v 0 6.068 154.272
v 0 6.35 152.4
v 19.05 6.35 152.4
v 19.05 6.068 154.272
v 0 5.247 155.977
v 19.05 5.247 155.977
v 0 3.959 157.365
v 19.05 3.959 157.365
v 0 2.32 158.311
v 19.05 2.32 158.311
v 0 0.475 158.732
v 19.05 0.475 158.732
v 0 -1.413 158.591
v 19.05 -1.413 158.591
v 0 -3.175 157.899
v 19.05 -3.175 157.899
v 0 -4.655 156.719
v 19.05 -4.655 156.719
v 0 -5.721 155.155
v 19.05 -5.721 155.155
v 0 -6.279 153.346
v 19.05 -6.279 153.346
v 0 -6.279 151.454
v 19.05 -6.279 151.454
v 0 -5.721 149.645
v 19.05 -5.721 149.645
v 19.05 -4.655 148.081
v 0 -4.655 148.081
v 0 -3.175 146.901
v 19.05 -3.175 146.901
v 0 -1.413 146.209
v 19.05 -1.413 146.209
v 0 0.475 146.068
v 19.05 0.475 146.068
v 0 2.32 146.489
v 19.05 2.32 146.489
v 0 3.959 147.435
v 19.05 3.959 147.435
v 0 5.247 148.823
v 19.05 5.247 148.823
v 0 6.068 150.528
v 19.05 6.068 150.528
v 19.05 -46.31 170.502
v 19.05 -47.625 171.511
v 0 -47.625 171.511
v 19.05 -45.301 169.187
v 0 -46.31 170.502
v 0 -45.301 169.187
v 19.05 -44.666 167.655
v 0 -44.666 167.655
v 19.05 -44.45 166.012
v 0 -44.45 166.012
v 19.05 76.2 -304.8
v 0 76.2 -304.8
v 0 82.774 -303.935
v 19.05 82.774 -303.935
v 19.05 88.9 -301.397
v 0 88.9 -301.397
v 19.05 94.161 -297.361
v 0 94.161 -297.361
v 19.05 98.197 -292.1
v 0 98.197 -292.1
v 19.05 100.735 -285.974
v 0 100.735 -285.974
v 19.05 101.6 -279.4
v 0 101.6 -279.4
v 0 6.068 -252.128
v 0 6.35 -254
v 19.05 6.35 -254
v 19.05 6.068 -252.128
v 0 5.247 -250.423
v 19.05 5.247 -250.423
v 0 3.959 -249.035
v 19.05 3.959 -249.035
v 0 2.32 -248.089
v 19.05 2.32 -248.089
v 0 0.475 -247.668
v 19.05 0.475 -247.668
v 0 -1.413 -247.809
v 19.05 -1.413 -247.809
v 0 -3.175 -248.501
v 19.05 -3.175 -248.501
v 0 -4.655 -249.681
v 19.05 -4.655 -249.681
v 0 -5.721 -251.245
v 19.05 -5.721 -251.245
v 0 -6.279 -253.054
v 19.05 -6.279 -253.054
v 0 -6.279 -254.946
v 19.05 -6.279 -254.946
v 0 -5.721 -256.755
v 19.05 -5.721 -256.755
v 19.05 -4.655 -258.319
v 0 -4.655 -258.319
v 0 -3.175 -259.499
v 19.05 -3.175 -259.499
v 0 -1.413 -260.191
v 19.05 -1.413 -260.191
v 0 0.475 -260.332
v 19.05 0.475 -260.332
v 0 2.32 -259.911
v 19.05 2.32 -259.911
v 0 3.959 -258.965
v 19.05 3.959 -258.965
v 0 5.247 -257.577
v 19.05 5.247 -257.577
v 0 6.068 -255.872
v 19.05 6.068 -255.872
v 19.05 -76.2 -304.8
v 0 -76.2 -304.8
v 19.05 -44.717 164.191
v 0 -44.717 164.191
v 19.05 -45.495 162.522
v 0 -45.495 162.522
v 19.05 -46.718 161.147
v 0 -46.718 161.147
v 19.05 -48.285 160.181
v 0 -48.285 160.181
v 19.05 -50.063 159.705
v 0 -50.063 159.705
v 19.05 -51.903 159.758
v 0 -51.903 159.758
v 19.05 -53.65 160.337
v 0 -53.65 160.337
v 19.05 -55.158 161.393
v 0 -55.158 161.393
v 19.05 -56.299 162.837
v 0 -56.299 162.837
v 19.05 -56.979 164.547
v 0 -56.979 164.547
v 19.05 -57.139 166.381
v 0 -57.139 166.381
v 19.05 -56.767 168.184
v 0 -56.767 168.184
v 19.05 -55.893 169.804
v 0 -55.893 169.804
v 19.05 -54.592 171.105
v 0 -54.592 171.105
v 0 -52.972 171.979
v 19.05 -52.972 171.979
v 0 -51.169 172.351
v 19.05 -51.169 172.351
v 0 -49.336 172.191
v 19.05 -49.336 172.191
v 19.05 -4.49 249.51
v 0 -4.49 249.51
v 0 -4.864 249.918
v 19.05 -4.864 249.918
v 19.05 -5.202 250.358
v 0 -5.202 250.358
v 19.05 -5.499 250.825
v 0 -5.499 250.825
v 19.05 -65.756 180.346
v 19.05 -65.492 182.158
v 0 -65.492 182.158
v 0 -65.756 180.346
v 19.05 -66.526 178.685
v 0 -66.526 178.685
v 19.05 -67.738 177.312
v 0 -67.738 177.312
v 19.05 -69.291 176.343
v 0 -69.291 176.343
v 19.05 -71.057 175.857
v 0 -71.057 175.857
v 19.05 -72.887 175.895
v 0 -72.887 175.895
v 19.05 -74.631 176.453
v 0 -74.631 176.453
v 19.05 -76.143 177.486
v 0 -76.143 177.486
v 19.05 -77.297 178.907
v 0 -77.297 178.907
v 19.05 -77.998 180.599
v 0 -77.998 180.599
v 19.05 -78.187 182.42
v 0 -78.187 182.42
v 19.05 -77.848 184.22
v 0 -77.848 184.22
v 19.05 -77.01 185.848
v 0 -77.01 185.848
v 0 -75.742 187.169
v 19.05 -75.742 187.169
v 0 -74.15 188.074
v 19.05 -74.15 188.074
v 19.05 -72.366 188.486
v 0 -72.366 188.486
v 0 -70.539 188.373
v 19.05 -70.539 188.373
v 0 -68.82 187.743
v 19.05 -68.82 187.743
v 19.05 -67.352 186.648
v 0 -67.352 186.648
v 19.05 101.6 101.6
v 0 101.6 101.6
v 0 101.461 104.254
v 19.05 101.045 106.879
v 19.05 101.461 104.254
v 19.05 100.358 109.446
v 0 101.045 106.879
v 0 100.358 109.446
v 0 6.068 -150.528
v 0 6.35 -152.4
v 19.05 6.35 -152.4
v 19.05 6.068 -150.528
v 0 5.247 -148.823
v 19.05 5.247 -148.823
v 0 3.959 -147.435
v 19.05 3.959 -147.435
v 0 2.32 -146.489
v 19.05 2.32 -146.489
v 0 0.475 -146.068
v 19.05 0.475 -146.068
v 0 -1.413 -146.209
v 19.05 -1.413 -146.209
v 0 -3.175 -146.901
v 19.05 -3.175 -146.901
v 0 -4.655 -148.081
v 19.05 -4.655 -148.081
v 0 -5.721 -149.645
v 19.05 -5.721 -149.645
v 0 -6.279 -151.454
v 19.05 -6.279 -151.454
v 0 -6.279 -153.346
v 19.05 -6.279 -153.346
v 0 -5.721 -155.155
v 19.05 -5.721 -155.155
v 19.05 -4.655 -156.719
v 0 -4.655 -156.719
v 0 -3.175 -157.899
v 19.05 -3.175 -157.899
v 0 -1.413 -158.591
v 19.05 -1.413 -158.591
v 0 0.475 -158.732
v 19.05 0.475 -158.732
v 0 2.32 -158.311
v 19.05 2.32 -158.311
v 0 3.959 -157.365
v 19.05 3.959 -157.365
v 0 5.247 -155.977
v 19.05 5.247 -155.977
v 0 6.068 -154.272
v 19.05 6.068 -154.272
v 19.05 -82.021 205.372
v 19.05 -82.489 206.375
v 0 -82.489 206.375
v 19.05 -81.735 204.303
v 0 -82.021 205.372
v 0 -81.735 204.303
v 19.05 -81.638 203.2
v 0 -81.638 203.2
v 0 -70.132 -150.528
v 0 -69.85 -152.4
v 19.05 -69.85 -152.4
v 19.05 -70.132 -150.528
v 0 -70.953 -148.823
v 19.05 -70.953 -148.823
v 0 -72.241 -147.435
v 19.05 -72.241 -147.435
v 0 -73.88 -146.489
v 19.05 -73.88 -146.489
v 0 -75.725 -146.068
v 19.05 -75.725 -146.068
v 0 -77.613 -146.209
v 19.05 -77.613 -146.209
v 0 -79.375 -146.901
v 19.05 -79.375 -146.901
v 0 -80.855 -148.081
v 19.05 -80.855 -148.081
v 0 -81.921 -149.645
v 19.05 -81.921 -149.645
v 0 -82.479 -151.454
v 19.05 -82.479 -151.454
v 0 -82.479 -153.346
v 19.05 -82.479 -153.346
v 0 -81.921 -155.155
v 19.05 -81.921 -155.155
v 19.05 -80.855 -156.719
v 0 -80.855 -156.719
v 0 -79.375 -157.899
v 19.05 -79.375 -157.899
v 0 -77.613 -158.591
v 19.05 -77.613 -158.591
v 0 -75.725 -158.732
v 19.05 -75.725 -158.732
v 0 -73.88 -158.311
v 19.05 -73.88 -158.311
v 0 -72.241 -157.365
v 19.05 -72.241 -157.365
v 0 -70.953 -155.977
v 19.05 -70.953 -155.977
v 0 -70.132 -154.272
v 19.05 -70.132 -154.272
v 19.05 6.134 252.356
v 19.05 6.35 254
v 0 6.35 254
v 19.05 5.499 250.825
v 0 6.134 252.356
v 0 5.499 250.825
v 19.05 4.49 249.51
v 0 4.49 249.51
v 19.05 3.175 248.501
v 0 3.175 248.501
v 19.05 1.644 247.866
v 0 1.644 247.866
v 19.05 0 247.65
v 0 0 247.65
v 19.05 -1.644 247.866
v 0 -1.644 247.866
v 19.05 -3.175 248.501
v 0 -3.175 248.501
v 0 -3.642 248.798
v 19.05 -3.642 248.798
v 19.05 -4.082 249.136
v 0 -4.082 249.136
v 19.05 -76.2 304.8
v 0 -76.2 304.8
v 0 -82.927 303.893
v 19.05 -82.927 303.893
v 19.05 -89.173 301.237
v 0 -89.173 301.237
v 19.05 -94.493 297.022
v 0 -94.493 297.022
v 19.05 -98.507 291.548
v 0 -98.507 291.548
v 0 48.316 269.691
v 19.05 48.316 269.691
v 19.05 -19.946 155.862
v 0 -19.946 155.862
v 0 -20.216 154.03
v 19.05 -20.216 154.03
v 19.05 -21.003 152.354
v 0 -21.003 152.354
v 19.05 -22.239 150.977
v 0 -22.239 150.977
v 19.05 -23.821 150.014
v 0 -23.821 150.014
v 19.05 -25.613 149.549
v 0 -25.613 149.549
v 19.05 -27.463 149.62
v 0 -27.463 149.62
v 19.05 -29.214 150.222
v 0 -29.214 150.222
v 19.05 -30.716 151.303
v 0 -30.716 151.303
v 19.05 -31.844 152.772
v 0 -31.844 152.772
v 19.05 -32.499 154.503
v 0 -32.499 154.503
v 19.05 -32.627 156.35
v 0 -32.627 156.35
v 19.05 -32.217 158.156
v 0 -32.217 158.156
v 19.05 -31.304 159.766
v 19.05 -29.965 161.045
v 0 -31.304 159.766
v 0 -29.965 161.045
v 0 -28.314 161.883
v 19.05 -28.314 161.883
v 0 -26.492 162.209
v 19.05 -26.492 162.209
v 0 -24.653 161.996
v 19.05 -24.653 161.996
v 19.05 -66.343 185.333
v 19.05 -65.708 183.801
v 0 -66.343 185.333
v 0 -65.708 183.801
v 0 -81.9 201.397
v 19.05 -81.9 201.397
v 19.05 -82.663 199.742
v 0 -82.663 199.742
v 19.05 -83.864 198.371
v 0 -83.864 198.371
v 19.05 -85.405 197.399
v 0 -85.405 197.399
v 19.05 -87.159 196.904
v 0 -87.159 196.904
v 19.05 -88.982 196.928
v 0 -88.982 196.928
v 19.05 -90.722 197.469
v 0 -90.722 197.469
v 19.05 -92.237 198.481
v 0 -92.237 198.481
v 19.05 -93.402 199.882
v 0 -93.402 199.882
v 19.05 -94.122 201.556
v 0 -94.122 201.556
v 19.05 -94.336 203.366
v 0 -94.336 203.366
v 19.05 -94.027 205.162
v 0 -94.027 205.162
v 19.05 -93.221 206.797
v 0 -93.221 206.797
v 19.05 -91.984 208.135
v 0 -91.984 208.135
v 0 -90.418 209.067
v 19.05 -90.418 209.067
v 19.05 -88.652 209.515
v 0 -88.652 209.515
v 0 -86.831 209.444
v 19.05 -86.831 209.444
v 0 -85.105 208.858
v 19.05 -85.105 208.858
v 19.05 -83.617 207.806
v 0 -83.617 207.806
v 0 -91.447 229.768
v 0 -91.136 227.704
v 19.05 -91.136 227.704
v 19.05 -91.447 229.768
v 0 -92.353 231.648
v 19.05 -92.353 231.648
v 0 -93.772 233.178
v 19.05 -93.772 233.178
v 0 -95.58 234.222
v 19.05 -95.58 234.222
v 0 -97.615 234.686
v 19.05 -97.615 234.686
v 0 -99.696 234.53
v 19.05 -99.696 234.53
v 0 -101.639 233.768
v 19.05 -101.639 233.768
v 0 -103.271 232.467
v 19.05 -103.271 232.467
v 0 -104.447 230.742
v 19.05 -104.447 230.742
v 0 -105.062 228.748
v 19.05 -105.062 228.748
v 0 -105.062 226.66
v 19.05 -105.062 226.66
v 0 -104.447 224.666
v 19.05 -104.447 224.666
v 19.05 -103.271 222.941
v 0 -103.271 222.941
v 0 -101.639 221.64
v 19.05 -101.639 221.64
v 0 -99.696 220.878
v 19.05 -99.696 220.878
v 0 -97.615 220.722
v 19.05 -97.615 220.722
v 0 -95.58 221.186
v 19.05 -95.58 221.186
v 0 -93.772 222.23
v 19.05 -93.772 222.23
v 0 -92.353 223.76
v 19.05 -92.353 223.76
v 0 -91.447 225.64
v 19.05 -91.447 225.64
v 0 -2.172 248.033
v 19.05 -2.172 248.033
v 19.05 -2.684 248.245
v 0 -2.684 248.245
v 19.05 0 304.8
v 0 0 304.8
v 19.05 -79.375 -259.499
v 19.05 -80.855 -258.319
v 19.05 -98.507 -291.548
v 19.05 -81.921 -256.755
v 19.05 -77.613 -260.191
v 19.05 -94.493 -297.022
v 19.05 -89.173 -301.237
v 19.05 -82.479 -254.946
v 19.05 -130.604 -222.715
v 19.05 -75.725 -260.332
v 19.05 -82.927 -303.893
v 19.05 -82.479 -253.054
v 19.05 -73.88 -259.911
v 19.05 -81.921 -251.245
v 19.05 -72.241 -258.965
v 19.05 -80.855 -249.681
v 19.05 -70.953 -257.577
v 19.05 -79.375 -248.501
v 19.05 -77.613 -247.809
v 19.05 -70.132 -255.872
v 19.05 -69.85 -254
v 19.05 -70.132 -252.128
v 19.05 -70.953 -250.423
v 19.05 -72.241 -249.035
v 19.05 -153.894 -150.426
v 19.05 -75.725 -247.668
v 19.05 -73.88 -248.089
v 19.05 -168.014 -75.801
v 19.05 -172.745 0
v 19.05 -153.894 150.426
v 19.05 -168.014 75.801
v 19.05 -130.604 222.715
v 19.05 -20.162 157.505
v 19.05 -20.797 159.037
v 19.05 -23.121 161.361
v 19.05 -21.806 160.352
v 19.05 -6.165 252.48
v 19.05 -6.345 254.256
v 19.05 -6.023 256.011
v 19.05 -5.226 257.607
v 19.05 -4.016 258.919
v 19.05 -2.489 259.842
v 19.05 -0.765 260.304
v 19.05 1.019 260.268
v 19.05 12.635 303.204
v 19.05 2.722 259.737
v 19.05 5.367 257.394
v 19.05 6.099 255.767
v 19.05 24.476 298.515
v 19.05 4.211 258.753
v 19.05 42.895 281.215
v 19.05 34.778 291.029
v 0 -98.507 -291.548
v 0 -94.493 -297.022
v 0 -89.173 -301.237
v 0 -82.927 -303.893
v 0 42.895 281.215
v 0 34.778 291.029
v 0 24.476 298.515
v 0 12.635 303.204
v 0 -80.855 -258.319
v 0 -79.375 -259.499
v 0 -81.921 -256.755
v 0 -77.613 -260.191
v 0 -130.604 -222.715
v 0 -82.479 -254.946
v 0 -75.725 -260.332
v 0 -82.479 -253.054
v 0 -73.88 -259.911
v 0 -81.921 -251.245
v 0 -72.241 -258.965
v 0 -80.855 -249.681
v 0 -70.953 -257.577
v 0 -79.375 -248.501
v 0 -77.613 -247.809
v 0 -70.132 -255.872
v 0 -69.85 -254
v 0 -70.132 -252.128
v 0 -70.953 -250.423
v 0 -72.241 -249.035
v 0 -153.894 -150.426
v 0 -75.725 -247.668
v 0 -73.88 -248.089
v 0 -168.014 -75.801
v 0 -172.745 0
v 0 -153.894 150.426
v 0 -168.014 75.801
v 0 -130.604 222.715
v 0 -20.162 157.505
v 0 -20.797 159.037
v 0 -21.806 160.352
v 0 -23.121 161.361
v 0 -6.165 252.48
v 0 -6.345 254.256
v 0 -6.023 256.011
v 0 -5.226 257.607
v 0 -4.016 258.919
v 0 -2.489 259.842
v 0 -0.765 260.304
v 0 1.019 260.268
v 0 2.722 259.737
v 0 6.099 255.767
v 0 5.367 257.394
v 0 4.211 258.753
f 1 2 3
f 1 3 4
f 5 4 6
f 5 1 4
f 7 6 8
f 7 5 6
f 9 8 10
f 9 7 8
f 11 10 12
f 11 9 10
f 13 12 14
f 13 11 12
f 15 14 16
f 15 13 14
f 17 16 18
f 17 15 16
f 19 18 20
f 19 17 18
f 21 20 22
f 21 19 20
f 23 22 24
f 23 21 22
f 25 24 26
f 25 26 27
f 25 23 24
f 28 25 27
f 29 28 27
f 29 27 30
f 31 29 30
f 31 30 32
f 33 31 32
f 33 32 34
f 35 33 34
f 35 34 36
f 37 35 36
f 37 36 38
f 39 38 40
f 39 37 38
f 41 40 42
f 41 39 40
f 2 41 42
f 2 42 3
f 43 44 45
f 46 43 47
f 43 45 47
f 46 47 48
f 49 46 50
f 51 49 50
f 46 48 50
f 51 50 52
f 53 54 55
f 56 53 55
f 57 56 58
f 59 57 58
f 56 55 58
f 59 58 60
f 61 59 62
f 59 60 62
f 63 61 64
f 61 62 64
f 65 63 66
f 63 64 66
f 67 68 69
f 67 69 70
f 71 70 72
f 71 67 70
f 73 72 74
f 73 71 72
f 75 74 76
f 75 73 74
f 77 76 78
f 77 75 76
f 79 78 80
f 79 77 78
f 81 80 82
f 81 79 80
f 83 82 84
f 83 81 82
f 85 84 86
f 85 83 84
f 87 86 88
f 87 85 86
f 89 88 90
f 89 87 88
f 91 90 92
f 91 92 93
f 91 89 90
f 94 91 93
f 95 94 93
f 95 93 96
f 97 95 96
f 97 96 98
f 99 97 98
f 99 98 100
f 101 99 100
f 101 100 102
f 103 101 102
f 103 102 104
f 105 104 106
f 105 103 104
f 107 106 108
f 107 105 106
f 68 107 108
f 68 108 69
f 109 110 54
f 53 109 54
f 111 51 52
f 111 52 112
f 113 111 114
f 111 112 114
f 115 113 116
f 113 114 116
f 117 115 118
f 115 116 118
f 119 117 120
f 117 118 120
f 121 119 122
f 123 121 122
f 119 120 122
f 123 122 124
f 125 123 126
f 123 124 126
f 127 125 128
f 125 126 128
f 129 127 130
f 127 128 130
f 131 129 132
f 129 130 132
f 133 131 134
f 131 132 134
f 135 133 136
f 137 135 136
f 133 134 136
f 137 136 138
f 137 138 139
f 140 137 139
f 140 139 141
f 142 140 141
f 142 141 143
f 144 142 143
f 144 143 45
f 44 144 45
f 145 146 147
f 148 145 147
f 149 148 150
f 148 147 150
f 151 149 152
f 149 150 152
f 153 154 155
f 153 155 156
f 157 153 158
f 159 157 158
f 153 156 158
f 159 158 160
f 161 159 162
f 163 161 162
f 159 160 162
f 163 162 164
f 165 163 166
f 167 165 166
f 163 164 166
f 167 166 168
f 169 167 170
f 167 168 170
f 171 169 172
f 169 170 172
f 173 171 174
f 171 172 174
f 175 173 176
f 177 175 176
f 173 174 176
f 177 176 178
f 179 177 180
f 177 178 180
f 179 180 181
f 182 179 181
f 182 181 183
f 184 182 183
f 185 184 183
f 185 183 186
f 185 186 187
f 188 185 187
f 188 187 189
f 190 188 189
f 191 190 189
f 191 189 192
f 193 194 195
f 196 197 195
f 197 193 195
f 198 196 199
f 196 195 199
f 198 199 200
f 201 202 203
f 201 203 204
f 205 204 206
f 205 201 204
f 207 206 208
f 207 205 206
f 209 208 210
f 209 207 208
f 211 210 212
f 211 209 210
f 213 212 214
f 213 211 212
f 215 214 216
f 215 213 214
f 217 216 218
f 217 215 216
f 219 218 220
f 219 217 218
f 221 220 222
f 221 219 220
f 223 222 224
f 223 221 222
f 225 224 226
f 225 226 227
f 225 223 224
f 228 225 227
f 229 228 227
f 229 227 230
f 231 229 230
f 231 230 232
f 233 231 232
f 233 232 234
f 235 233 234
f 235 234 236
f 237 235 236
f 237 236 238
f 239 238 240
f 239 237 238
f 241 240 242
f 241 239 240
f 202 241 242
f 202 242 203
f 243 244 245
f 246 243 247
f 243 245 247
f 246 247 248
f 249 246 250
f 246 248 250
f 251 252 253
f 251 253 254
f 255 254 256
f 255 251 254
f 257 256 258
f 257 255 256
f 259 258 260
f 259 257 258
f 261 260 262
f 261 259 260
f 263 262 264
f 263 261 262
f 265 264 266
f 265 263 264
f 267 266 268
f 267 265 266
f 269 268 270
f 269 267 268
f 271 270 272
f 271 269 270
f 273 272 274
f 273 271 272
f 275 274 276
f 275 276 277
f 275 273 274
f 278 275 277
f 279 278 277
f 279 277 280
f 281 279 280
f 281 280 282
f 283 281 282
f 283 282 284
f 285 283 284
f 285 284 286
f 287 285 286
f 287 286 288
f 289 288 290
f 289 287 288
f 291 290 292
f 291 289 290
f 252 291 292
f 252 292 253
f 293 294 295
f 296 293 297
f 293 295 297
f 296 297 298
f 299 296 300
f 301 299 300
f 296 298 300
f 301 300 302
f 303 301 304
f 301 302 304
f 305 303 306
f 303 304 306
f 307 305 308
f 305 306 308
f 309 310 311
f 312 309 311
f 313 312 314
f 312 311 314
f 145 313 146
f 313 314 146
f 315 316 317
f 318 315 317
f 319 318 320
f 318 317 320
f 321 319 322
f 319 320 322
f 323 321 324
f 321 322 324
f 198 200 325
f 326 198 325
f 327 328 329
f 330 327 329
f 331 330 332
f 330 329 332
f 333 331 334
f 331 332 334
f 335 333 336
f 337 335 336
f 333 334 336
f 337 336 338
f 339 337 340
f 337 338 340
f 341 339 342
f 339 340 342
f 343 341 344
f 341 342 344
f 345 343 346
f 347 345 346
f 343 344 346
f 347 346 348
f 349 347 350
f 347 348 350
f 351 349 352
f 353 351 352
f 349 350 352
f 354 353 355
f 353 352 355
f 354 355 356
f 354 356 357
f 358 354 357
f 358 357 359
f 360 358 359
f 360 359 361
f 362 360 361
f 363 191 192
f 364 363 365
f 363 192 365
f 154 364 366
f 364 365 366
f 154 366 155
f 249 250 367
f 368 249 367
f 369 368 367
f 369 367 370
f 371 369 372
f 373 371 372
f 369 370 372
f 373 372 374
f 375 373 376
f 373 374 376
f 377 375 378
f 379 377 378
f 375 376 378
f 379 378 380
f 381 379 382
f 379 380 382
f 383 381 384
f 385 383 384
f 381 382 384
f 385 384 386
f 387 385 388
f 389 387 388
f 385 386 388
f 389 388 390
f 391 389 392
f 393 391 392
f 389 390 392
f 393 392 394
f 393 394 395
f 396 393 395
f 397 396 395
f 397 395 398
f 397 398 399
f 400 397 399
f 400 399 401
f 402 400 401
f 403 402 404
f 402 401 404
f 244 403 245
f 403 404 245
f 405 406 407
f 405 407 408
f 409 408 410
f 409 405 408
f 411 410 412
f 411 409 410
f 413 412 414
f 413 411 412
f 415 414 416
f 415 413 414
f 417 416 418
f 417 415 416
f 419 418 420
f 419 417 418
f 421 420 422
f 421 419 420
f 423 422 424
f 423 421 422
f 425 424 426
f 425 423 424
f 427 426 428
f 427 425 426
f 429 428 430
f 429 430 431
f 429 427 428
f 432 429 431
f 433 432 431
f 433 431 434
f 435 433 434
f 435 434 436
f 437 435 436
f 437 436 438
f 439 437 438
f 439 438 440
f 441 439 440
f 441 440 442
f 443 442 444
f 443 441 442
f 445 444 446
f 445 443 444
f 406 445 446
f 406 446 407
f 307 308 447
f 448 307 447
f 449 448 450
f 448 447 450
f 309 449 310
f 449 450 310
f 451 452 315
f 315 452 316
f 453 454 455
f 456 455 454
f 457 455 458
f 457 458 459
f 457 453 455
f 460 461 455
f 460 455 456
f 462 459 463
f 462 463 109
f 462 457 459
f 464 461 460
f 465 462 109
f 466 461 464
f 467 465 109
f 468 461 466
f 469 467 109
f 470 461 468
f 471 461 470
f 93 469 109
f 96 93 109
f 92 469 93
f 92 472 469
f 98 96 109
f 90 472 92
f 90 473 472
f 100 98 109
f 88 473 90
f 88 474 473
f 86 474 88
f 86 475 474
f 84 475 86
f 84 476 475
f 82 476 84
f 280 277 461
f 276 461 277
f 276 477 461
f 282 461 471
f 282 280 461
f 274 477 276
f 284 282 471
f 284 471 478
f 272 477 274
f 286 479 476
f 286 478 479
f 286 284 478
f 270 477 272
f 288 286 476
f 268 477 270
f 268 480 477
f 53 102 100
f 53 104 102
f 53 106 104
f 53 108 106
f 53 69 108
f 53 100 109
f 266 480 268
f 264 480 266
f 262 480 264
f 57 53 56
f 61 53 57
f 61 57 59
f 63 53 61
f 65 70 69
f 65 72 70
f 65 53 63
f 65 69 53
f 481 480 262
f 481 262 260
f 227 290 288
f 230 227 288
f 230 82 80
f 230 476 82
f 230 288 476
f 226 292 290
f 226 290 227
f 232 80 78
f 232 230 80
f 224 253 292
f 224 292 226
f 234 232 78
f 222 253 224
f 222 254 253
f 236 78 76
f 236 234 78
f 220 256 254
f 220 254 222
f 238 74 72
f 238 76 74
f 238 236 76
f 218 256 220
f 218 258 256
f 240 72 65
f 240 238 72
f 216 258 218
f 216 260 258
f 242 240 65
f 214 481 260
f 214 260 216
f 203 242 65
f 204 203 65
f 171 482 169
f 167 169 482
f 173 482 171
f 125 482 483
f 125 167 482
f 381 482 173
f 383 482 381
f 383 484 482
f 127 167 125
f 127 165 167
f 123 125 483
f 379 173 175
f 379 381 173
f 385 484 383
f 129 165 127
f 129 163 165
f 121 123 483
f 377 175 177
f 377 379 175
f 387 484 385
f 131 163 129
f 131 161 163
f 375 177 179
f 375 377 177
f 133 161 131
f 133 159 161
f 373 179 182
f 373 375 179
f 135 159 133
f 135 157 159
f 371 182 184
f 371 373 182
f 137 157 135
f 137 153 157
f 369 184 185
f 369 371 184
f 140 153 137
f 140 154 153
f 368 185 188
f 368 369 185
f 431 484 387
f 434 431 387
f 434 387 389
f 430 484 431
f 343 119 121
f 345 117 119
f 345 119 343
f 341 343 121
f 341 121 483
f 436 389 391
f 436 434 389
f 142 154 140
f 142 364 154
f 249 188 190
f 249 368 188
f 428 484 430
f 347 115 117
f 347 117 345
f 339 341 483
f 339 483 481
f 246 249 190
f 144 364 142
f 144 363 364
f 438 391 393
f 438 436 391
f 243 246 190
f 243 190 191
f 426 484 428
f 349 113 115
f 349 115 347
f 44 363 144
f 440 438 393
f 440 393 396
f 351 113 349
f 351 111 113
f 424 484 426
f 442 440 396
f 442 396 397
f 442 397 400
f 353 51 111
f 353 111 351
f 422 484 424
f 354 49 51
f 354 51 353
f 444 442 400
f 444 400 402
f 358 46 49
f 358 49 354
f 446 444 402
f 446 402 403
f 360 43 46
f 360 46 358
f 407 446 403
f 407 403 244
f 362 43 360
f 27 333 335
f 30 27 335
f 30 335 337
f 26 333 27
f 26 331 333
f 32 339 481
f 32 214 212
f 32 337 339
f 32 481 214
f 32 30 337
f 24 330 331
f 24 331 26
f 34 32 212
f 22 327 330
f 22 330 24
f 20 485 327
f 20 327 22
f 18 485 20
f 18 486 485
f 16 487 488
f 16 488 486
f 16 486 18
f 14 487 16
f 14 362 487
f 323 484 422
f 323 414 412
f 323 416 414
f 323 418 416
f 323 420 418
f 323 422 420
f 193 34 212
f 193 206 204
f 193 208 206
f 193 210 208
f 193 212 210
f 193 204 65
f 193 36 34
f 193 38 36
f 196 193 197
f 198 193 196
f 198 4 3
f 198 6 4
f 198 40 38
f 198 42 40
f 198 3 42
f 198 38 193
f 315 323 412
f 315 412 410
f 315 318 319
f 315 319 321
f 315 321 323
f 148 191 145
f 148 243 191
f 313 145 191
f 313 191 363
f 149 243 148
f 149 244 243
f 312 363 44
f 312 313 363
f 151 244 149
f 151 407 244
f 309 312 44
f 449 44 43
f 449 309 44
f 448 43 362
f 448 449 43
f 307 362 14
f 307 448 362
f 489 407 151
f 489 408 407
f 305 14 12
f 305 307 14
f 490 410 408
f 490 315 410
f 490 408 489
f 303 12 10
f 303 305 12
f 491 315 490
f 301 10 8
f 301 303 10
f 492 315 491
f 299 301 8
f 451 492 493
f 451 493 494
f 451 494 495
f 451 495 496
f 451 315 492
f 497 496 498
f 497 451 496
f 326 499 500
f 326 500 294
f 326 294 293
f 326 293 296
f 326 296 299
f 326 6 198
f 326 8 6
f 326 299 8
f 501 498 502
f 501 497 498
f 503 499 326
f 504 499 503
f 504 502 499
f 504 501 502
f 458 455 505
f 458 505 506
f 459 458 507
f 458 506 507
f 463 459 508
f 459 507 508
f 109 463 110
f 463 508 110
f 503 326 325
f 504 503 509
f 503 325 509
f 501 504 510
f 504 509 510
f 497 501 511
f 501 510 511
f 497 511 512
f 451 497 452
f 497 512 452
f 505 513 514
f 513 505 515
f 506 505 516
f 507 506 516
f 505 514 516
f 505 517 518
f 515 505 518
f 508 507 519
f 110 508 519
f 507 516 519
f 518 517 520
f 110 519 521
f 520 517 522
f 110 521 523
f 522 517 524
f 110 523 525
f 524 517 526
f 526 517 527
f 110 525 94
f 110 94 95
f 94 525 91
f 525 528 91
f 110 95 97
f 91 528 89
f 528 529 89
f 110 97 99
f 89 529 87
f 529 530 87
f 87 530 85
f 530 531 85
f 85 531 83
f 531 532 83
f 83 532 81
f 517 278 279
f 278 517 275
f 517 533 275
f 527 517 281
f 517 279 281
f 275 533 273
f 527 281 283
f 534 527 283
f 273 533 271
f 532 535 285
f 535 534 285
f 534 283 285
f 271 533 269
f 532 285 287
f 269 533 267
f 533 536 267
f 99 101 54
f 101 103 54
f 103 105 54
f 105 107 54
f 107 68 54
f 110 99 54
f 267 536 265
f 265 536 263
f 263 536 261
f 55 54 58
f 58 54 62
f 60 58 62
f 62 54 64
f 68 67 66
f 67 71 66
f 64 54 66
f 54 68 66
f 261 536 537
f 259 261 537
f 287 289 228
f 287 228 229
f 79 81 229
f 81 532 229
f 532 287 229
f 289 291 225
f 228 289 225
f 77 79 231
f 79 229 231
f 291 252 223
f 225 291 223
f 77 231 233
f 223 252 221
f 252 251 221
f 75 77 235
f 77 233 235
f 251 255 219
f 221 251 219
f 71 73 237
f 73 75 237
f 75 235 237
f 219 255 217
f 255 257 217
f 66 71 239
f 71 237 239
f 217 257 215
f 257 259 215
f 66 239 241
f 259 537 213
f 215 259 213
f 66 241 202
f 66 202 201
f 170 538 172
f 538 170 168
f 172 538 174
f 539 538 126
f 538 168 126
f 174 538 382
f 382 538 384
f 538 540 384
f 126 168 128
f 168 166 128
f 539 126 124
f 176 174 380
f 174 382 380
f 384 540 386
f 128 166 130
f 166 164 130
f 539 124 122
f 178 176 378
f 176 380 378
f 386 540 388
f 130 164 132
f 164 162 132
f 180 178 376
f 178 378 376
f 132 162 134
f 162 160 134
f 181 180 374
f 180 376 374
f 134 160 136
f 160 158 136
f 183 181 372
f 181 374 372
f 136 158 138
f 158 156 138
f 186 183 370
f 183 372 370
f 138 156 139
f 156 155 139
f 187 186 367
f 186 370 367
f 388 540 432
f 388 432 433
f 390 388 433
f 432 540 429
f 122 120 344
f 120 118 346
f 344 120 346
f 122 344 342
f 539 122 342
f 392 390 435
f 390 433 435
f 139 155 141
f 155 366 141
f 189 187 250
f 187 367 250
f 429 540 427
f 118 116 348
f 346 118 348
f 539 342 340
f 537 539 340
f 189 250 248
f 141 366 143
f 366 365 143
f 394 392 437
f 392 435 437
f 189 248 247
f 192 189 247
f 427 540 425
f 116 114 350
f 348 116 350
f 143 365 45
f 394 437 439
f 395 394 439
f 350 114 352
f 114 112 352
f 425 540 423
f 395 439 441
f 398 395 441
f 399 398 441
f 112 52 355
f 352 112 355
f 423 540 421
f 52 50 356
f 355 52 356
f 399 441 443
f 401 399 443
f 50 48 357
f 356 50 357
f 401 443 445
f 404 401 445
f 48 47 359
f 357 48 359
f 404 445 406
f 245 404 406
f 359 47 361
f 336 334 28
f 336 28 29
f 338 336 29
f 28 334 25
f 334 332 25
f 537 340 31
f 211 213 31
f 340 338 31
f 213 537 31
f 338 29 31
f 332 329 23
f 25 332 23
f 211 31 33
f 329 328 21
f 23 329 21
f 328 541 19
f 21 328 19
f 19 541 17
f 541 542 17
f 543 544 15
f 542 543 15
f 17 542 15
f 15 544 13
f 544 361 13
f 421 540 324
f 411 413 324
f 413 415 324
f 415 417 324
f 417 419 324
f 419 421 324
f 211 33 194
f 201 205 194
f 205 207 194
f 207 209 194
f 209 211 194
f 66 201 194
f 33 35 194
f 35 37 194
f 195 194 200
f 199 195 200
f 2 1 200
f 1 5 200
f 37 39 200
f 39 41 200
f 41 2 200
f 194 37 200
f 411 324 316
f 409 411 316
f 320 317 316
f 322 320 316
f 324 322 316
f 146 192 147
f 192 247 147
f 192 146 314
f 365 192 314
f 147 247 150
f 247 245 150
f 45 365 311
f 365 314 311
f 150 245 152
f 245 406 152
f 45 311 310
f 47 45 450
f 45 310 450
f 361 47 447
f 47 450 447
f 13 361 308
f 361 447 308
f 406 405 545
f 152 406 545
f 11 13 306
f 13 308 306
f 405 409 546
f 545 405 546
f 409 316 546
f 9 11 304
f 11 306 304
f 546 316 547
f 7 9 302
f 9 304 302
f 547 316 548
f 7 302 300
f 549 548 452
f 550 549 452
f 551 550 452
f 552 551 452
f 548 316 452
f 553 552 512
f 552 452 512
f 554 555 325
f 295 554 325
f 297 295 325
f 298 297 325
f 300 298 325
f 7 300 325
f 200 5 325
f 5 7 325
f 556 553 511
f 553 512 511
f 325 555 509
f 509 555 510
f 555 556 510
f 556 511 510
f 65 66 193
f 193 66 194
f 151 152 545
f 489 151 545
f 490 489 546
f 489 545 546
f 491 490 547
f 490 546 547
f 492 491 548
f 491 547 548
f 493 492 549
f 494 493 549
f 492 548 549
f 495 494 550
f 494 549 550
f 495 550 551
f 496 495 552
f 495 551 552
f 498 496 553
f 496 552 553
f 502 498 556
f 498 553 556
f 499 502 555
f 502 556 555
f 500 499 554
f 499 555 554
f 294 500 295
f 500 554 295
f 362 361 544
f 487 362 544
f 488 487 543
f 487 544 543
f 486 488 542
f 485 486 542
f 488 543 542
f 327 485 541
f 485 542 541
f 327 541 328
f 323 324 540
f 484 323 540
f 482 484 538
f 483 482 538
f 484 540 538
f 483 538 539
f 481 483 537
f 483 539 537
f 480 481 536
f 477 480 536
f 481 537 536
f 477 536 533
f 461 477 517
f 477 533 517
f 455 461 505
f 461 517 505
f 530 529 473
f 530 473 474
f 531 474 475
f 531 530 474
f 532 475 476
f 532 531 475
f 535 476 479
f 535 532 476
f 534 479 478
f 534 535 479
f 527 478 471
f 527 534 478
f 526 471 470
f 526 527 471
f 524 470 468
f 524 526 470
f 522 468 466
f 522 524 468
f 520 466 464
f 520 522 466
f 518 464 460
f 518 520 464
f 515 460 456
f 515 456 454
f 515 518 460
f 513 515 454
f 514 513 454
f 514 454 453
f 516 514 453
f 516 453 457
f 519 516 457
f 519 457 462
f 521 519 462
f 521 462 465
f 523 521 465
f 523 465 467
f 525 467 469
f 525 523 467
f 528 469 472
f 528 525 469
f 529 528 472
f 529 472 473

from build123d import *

# Parameters (mm, degrees)
F0_R     = 6.35
F0_R_2   = 7.002019
F1_DEPTH = 19.05
F3_DEPTH = 19.051


with BuildPart() as f1:
    # F0 (on Right) → F1 (new body)
    with BuildSketch(Plane.YZ):
        with BuildLine():
            ThreePointArc((-19.946015, 155.861936), (-21.258221, 159.727571), (-24.652514, 161.995565))
            ThreePointArc((-24.652514, 161.995565), (-31.333809, 151.996301), (-19.946015, 155.861936))
        make_face()
        with BuildLine():
            ThreePointArc((-44.45, 166.011819), (-45.300739, 169.186819), (-47.625, 171.51108))
            ThreePointArc((-47.625, 171.51108), (-56.299261, 162.836819), (-44.45, 166.011819))
        make_face()
        with BuildLine():
            ThreePointArc((-65.492049, 182.157951), (-65.975414, 184.587991), (-67.351921, 186.648079))
            ThreePointArc((-67.351921, 186.648079), (-77.708684, 179.727911), (-65.492049, 182.157951))
        make_face()
        with BuildLine():
            ThreePointArc((-81.638181, 203.2), (-81.854552, 204.843501), (-82.48892, 206.375))
            ThreePointArc((-82.48892, 206.375), (-94.12181, 201.556499), (-81.638181, 203.2))
        make_face()
        with BuildLine():
            Line((-76.2, -304.8), (76.2, -304.8))
            ThreePointArc((76.2, -304.8), (94.160512, -297.360512), (101.6, -279.4))
            Line((101.6, -279.4), (101.6, 304.8))
            Line((101.6, 304.8), (-76.2, 304.8))
            ThreePointArc((-76.2, 304.8), (-89.17315, 301.237065), (-98.506733, 291.547826))
            ThreePointArc((-98.506733, 291.547826), (-172.745149, 0), (-98.506733, -291.547826))
            ThreePointArc((-98.506733, -291.547826), (-89.17315, -301.237065), (-76.2, -304.8))
        make_face()
        with Locations((-76.2, -254)):
            Circle(F0_R, mode=Mode.SUBTRACT)
        with Locations((-76.2, -152.4)):
            Circle(F0_R, mode=Mode.SUBTRACT)
        with Locations((0, -254)):
            Circle(F0_R, mode=Mode.SUBTRACT)
        with Locations((0, -152.4)):
            Circle(F0_R, mode=Mode.SUBTRACT)
        with BuildLine():
            ThreePointArc((-65.492049, 182.157951), (-77.708684, 179.727911), (-67.351921, 186.648079))
            ThreePointArc((-67.351921, 186.648079), (-65.975414, 184.587991), (-65.492049, 182.157951))
        make_face(mode=Mode.SUBTRACT)
        with BuildLine():
            ThreePointArc((-81.638181, 203.2), (-94.12181, 201.556499), (-82.48892, 206.375))
            ThreePointArc((-82.48892, 206.375), (-81.854552, 204.843501), (-81.638181, 203.2))
        make_face(mode=Mode.SUBTRACT)
        with Locations((-98.138064, 227.703985)):
            Circle(F0_R_2, mode=Mode.SUBTRACT)
        with BuildLine():
            ThreePointArc((-44.45, 166.011819), (-56.299261, 162.836819), (-47.625, 171.51108))
            ThreePointArc((-47.625, 171.51108), (-45.300739, 169.186819), (-44.45, 166.011819))
        make_face(mode=Mode.SUBTRACT)
        with Locations((0, 152.4)):
            Circle(F0_R, mode=Mode.SUBTRACT)
        with BuildLine():
            ThreePointArc((-19.946015, 155.861936), (-31.333809, 151.996301), (-24.652514, 161.995565))
            ThreePointArc((-24.652514, 161.995565), (-21.258221, 159.727571), (-19.946015, 155.861936))
        make_face(mode=Mode.SUBTRACT)
        with BuildLine():
            ThreePointArc((-5.499261, 250.825), (-1.643501, 260.133629), (6.35, 254))
            ThreePointArc((6.35, 254), (3.865635, 248.962206), (-1.643501, 247.866371))
            ThreePointArc((-1.643501, 247.866371), (-2.43004, 248.133365), (-3.175, 248.500739))
            ThreePointArc((-3.175, 248.500739), (-3.865635, 248.962206), (-4.490128, 249.509872))
            ThreePointArc((-4.490128, 249.509872), (-5.037794, 250.134365), (-5.499261, 250.825))
        make_face(mode=Mode.SUBTRACT)
    extrude(amount=F1_DEPTH)

    # F2 (on face) → F3 (cut, through all)
    with BuildSketch(Plane(origin=(0, 0, 0), x_dir=(0, -1, 0), z_dir=(-1, 0, 0))):
        with BuildLine():
            ThreePointArc((-48.315877, 269.691272), (-29.862379, 295.095965), (0, 304.8))
            Line((0, 304.8), (-101.6, 304.8))
            Line((-101.6, 304.8), (-101.6, 101.6))
            ThreePointArc((-101.6, 101.6), (-101.287563, 105.571672), (-100.357939, 109.445636))
            Line((-100.357939, 109.445636), (-48.315877, 269.691272))
        make_face()
    extrude(amount=-F3_DEPTH, mode=Mode.SUBTRACT)


solid = f1.part
